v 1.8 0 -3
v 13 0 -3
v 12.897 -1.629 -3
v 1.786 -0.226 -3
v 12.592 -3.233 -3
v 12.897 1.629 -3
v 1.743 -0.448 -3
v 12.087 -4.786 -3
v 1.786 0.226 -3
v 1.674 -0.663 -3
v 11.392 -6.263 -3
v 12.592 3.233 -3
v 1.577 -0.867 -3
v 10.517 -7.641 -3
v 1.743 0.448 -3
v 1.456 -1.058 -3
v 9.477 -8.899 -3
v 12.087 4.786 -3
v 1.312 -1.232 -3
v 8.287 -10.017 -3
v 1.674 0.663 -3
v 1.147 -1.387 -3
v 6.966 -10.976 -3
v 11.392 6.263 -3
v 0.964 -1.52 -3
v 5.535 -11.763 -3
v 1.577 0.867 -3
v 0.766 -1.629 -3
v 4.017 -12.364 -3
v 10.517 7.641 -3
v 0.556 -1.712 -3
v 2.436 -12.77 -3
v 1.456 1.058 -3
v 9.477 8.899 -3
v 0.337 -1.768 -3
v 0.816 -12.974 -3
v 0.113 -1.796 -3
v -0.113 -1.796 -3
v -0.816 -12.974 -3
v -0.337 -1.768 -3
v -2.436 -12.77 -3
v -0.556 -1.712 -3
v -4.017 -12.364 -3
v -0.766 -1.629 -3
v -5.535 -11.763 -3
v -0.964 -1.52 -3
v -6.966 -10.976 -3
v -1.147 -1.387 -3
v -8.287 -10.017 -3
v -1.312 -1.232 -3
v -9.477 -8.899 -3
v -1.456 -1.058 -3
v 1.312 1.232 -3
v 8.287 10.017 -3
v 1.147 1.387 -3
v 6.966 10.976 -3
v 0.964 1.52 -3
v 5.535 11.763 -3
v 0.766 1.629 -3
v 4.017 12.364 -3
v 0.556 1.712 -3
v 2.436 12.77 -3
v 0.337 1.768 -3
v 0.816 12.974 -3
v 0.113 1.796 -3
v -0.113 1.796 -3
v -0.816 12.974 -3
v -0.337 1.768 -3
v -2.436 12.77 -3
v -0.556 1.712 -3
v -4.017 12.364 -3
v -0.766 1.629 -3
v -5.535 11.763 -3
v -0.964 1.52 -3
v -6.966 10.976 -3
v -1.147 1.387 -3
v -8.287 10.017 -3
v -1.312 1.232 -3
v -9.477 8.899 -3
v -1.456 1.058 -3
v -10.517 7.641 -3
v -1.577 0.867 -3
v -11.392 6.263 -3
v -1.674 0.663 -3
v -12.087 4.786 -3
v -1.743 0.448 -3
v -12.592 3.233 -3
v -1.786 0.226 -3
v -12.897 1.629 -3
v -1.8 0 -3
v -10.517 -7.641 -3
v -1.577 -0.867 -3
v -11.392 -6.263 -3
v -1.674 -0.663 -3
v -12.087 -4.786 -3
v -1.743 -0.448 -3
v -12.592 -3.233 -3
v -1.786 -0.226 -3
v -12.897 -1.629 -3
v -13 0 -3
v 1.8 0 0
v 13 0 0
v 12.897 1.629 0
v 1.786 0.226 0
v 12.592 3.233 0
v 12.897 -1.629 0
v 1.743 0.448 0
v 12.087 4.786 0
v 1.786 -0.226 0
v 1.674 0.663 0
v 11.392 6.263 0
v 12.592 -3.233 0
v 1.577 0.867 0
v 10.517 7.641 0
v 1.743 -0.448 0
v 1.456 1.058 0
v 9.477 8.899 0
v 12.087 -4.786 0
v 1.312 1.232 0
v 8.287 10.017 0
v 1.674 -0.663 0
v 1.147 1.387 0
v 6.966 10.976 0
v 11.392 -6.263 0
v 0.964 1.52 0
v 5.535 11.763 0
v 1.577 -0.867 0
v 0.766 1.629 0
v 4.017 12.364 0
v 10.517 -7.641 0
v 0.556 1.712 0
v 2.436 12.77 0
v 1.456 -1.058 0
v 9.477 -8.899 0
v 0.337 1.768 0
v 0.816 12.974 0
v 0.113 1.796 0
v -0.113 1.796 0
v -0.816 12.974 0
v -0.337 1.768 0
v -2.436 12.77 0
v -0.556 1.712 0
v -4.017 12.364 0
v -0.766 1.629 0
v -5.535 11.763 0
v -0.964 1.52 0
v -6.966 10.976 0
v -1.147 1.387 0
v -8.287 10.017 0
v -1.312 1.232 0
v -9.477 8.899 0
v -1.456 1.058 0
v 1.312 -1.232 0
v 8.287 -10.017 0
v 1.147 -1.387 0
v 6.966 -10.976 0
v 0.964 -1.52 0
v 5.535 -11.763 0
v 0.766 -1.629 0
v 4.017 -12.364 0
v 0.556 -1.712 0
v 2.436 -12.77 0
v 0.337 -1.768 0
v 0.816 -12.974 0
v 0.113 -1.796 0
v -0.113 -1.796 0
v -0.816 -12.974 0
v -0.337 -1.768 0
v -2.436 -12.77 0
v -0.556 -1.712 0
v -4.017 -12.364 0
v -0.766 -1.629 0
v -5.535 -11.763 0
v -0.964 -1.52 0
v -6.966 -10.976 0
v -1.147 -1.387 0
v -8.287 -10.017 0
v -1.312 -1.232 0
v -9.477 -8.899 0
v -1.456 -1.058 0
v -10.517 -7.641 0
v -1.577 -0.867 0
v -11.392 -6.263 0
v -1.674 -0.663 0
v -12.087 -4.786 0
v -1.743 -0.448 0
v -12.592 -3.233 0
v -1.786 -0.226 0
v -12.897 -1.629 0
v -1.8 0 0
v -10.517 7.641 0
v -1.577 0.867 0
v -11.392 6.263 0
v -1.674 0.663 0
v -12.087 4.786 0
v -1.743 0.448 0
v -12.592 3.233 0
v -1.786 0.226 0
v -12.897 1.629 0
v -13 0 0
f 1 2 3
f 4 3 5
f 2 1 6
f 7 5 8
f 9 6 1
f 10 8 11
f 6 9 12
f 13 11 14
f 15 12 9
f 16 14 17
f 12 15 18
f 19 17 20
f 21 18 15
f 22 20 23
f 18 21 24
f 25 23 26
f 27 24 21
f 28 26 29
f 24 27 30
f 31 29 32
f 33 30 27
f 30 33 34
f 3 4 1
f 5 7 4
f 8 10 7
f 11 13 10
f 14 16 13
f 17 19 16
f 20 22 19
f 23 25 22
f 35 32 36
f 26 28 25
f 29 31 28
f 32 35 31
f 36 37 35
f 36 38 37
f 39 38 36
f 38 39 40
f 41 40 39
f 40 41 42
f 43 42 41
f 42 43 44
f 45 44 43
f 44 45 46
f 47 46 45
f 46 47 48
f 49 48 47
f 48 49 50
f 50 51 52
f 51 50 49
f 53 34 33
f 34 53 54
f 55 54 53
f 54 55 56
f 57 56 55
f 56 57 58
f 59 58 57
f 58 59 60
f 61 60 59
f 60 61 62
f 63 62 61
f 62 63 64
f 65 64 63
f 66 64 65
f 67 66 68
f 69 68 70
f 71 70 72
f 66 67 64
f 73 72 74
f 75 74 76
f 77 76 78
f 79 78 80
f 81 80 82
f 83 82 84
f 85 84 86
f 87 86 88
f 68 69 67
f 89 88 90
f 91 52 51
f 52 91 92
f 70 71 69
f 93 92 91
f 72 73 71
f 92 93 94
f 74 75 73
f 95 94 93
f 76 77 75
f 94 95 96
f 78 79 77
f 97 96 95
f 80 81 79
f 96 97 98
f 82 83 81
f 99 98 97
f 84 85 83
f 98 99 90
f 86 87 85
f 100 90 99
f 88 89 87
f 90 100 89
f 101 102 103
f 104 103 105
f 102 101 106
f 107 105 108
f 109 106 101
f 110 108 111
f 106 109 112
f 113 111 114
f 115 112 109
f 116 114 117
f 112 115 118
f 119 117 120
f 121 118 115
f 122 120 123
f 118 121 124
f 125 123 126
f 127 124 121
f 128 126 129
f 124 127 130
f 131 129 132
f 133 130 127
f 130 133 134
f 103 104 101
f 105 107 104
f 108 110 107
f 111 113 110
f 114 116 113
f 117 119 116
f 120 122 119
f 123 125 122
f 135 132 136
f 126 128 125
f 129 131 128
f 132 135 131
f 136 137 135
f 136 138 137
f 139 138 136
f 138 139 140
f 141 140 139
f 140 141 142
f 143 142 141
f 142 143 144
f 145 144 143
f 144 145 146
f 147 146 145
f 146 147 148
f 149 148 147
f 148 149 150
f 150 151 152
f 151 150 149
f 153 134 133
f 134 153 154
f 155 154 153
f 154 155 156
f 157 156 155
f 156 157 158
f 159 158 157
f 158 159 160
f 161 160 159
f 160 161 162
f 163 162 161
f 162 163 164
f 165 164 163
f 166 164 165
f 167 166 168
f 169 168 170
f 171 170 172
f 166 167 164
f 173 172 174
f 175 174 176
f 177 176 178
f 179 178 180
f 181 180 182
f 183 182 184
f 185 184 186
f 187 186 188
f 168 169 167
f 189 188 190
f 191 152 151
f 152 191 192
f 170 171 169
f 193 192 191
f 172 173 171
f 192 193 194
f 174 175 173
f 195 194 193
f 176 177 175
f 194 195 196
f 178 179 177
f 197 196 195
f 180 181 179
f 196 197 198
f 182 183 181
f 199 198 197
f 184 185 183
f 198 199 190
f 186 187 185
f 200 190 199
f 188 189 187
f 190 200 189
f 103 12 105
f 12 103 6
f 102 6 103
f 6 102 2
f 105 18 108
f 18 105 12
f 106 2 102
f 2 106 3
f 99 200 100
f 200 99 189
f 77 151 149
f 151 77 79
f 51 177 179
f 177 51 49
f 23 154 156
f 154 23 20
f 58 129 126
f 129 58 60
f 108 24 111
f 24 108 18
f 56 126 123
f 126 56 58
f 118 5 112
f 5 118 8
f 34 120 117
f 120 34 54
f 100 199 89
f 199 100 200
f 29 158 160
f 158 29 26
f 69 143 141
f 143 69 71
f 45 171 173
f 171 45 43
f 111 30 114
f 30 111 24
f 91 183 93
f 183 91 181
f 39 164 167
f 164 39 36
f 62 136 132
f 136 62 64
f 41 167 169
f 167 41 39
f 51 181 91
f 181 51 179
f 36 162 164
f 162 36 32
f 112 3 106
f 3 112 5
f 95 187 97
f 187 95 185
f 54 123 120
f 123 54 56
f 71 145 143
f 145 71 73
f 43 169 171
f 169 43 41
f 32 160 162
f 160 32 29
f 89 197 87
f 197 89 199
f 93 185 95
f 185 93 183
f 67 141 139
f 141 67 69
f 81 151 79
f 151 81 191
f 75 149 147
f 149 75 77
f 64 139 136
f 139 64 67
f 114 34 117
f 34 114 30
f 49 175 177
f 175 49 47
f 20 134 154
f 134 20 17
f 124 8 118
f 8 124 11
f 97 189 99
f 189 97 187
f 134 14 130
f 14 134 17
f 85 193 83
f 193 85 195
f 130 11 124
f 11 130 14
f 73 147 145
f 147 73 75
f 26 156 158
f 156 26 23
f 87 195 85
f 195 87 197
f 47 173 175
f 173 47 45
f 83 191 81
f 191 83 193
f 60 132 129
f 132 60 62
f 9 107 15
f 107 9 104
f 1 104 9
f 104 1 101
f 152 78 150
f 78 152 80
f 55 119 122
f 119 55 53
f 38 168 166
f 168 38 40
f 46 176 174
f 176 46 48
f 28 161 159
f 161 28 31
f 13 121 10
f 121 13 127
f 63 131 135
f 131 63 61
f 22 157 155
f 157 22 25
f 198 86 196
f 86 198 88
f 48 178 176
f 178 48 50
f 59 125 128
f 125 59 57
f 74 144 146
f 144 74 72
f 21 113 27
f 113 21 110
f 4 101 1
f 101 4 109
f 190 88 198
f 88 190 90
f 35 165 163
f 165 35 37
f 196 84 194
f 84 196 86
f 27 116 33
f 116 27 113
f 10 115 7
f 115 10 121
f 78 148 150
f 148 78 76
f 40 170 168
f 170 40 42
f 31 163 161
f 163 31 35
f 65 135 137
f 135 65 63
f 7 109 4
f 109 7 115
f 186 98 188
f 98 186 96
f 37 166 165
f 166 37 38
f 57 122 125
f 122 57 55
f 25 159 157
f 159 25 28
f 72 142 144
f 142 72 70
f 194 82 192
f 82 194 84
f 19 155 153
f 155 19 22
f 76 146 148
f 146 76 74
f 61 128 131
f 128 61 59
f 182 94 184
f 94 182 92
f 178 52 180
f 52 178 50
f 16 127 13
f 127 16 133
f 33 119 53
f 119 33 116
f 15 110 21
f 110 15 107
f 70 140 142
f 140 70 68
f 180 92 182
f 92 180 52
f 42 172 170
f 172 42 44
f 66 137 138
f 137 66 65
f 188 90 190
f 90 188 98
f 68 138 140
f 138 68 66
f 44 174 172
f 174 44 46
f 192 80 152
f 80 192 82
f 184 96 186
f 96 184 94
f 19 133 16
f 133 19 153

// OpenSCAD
$fn = 50;


difference() {
	union() {
		translate(v = [0, 0, -3.0000000000]) {
			cylinder(h = 3, r = 10.0000000000);
		}
		translate(v = [0, 0, -3.0000000000]) {
			cylinder(h = 3, r = 13.0000000000);
		}
	}
	union() {
		#translate(v = [0, 0, -3]) {
			cylinder(h = 3, r = 1.8000000000);
		}
	}
}
